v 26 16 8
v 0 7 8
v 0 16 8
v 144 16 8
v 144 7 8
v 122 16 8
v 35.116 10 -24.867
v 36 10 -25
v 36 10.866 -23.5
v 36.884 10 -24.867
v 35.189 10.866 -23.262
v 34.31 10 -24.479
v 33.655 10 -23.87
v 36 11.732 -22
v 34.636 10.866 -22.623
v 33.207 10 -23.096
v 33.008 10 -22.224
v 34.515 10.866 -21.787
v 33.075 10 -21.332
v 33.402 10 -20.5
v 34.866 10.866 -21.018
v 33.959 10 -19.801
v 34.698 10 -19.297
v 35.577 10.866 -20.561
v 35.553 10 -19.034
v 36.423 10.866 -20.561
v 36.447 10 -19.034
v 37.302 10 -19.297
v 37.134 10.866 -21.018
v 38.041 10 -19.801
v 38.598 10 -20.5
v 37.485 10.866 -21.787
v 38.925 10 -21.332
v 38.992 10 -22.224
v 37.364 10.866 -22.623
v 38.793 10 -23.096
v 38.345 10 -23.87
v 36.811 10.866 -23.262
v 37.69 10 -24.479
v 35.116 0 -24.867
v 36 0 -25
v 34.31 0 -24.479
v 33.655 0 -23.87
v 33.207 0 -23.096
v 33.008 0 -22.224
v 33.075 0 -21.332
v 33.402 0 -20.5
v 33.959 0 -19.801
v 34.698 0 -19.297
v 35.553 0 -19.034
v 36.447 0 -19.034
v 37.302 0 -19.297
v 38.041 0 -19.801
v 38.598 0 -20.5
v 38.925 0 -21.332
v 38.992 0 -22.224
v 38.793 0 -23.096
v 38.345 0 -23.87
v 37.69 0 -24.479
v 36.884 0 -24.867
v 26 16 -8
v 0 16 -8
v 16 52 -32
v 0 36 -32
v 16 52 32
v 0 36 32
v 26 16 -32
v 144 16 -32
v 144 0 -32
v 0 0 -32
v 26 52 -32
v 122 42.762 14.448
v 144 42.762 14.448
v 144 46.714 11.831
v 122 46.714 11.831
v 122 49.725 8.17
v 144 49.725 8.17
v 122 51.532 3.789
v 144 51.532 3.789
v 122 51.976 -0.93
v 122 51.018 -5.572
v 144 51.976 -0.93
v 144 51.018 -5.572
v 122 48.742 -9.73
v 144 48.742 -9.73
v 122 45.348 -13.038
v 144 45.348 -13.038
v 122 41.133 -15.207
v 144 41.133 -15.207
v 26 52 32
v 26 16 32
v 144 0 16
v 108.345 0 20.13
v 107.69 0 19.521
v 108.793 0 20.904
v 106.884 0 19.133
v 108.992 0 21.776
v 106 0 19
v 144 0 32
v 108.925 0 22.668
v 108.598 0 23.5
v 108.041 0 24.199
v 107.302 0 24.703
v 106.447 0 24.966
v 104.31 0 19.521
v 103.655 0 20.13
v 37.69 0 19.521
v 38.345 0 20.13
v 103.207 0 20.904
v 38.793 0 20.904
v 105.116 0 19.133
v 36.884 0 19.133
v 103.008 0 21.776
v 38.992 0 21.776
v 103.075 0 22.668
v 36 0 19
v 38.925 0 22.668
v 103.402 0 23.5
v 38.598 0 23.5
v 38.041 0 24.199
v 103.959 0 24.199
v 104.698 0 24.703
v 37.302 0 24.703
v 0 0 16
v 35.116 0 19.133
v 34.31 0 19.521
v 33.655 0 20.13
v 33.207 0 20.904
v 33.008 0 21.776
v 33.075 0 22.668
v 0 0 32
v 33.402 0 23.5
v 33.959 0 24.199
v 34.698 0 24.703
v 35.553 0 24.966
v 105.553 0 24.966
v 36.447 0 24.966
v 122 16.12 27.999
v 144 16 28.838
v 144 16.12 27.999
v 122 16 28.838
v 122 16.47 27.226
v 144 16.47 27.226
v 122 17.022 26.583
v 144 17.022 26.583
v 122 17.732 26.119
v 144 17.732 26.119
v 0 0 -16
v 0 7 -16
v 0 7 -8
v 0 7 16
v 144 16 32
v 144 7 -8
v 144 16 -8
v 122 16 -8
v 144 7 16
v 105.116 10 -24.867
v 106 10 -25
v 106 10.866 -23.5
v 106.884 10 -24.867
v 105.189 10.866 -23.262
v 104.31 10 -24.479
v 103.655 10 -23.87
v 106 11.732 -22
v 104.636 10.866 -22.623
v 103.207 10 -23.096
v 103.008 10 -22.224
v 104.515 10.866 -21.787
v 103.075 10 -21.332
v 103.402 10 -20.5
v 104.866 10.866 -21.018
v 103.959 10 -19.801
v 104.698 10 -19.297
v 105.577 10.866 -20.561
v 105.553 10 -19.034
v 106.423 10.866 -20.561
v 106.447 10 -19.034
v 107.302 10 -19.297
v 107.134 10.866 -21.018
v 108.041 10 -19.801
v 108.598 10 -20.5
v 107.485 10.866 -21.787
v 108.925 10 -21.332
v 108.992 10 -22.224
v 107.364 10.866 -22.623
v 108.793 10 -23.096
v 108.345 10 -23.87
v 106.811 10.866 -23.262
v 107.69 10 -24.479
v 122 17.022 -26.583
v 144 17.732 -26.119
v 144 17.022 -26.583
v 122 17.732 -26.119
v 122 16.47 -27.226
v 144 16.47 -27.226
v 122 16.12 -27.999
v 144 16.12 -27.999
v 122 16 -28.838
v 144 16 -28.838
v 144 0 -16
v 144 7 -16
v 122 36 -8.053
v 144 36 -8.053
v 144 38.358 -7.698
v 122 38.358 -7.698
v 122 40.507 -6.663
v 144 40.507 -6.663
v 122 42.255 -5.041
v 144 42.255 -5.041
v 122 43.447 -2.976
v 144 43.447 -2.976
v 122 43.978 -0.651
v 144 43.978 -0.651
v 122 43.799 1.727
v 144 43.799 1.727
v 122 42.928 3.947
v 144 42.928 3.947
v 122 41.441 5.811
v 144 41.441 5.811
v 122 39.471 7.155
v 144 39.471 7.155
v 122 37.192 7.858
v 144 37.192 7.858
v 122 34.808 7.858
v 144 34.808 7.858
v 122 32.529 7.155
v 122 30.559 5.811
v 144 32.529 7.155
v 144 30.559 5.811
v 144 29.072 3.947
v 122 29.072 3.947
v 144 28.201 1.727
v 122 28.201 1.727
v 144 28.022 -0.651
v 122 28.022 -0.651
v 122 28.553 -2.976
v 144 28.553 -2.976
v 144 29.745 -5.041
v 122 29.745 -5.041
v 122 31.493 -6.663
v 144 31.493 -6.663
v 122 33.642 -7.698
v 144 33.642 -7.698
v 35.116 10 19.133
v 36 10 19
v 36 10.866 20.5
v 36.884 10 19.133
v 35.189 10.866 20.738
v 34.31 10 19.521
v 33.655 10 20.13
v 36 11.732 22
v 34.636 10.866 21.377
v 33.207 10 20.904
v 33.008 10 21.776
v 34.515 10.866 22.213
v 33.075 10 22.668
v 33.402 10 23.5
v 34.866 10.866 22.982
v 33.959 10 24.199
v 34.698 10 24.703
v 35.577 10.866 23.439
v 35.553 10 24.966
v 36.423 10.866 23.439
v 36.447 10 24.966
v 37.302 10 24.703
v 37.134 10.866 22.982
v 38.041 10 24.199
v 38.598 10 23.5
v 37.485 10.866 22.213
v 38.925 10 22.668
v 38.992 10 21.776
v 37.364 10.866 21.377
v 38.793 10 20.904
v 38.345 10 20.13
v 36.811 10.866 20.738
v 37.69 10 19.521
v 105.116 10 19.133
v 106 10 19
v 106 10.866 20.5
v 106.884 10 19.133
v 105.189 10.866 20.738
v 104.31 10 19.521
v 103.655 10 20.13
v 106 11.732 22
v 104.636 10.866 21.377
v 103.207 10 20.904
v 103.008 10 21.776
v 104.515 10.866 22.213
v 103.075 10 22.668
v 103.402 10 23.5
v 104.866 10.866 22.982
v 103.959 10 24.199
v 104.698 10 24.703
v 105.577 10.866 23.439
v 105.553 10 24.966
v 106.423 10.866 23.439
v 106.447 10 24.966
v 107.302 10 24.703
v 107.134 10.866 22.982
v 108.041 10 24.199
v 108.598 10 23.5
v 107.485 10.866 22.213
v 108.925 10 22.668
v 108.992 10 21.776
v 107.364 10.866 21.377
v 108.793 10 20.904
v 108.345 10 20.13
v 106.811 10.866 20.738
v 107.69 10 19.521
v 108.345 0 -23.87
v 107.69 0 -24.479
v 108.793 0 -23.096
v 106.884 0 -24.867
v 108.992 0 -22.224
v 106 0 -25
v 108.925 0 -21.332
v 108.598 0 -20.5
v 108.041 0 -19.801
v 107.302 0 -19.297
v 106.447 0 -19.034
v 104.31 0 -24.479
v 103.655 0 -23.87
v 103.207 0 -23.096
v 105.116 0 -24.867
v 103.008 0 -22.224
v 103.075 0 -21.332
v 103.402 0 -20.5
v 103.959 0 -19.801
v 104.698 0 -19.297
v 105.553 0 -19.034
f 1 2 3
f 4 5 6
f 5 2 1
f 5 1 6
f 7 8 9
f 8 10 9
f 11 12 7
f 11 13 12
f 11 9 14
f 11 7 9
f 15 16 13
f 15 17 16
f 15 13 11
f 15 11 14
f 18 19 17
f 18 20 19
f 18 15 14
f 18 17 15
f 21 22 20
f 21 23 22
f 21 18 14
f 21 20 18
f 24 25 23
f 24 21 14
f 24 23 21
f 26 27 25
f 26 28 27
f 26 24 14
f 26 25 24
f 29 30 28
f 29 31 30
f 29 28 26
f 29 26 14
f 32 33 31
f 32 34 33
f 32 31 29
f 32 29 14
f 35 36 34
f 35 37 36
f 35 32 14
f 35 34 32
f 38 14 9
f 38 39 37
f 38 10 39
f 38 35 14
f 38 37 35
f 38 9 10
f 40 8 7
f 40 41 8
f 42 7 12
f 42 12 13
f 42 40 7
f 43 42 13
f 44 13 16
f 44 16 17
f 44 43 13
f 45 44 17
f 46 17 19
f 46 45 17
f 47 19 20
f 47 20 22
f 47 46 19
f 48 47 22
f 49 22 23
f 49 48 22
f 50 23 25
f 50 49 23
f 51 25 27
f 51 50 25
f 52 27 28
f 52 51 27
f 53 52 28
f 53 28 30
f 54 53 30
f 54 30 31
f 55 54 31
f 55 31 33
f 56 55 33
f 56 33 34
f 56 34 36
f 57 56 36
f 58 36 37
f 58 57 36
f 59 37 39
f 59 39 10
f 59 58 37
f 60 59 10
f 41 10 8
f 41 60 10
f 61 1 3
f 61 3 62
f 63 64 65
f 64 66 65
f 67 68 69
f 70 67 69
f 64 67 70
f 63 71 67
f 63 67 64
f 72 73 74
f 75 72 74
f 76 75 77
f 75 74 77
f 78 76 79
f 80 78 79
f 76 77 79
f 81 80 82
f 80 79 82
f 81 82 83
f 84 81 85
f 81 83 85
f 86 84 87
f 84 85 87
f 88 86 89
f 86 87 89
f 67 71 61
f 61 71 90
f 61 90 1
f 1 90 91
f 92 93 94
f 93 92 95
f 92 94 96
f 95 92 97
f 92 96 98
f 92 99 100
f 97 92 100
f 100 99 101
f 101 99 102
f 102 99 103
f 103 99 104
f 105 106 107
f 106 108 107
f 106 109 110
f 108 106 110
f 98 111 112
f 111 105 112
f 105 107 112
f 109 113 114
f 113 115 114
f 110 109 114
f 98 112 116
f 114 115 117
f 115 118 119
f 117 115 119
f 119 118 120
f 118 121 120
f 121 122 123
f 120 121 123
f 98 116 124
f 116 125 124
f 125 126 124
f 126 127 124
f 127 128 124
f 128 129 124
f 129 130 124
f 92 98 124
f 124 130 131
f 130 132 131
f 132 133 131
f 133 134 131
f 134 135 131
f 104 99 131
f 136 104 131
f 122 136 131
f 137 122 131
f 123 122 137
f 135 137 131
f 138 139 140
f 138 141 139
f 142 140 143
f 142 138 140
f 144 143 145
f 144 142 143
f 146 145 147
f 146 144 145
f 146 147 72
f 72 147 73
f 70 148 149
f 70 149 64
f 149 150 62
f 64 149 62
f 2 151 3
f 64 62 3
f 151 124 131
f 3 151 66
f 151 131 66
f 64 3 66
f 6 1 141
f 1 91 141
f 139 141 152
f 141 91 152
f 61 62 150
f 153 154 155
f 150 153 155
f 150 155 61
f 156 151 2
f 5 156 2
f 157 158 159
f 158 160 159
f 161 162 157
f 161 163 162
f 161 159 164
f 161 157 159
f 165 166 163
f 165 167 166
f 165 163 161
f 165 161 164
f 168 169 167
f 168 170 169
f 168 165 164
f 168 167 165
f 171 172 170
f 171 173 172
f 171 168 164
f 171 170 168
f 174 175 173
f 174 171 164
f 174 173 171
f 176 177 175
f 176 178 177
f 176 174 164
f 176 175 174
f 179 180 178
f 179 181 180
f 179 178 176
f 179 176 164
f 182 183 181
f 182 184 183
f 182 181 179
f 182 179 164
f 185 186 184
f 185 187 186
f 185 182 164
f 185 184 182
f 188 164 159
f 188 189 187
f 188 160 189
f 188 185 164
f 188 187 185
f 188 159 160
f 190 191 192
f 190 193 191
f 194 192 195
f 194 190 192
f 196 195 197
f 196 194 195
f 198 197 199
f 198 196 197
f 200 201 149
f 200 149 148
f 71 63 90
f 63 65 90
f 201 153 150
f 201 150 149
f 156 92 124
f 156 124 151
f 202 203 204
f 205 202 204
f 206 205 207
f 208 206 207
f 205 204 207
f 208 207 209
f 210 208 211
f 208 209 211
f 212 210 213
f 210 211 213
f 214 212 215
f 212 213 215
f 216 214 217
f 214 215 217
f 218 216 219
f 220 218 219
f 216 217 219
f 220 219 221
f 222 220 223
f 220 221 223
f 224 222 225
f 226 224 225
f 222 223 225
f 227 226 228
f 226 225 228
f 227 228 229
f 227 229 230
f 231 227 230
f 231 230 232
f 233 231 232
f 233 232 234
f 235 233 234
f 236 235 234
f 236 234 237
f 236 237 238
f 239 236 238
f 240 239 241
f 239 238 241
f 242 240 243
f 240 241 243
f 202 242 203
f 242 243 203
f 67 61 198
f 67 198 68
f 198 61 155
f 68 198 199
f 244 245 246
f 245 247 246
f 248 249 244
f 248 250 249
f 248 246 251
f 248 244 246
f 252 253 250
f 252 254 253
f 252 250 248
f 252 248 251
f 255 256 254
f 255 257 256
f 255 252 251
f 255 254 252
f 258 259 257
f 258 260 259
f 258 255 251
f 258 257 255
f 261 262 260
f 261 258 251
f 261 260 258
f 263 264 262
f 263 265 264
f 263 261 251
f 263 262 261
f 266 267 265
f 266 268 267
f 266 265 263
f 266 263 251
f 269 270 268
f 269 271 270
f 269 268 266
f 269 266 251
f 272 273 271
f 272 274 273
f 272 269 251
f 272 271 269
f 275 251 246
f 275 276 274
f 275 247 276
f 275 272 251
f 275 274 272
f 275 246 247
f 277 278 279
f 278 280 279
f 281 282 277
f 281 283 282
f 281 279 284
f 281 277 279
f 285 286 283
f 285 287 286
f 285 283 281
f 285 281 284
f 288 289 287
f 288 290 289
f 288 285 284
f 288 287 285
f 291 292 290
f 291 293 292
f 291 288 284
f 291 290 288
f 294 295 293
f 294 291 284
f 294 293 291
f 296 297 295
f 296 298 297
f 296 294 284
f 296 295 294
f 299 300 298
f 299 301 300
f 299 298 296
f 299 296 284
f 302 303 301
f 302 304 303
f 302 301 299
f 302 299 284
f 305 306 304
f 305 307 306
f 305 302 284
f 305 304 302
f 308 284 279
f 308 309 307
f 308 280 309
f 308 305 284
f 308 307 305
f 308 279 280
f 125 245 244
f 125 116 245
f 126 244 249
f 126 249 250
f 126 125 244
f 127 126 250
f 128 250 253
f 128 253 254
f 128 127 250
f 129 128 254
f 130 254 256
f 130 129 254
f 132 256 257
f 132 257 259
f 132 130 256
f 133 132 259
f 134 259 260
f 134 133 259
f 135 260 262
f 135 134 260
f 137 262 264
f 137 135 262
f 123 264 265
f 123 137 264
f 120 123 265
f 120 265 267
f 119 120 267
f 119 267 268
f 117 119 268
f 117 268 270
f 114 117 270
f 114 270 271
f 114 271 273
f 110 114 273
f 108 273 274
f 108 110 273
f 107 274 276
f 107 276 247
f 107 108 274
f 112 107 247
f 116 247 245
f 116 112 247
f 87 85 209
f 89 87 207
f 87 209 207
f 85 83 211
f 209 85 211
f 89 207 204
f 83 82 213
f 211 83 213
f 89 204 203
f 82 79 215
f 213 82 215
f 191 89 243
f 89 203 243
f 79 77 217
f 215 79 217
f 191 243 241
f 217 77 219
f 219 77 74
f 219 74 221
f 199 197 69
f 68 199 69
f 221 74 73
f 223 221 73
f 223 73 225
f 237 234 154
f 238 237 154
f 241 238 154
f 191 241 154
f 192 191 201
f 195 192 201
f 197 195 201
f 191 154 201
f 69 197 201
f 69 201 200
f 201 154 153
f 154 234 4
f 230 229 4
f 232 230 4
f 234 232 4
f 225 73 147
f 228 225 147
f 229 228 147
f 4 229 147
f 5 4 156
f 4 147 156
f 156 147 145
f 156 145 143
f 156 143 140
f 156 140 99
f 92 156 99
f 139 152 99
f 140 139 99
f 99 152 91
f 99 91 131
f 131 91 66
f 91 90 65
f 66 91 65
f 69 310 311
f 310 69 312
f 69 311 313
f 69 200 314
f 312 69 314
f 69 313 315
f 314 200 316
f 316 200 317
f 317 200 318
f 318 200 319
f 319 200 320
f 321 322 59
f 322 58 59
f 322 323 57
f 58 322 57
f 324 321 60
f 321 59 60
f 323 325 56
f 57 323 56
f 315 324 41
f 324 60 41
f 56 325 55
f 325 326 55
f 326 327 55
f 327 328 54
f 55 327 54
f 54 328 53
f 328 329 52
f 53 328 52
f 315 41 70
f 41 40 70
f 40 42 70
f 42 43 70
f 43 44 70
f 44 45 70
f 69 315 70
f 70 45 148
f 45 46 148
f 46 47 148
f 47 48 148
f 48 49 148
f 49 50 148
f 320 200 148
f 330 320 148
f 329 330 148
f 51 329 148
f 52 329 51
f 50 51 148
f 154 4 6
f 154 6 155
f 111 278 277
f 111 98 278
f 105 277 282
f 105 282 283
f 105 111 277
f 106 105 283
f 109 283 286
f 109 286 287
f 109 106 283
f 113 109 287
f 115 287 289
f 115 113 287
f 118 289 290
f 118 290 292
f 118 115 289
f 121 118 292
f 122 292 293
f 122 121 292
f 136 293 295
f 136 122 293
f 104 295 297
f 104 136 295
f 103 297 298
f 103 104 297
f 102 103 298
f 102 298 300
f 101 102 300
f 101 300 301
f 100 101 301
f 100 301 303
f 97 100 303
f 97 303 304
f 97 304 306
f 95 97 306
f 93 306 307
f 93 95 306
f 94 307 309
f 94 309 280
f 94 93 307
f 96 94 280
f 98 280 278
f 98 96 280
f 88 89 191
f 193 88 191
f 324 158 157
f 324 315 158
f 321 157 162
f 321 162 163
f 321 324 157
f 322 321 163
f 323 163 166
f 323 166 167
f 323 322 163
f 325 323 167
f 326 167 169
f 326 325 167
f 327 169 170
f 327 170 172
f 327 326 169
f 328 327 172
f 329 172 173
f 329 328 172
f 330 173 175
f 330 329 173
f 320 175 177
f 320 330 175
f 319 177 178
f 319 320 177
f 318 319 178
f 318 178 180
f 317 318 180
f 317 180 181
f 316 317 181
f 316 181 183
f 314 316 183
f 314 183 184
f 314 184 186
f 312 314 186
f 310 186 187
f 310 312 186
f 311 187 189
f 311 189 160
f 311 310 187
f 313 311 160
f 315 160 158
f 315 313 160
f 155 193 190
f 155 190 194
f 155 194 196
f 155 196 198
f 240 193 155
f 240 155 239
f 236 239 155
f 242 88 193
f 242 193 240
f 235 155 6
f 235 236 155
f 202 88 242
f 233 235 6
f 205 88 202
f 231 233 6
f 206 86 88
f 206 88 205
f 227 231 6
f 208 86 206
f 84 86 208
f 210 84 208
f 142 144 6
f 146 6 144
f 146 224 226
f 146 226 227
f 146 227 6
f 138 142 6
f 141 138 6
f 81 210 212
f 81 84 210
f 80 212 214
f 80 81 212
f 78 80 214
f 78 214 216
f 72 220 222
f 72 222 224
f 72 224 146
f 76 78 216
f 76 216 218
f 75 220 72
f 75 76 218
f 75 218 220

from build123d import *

# Parameters (mm, degrees)
BOSS_EXTRUDE1_DEPTH  = 32
BOSS_EXTRUDE7_DEPTH  = 22
SKETCH10_R           = 8
CUT_EXTRUDE1_DEPTH   = 22
FILLET1_R            = 3
FILLET2_R            = 3
CUT_EXTRUDE2_DEPTH   = 157.409718368
LPATTERN1_COUNT      = 2
LPATTERN1_PITCH      = 70
LPATTERN1_COUNT_DIR2 = 2
LPATTERN1_PITCH_DIR2 = 44


with BuildPart() as part:
    # Sketch3 → Boss-Extrude1 (new, symmetric)
    with BuildSketch(Plane.XY):
        Polygon((0, 0), (0, 36), (16, 52), (26, 52), (26, 16), (144, 16), (144, 0), align=None)
    extrude(amount=BOSS_EXTRUDE1_DEPTH, both=True)

    # Sketch4 → Boss-Extrude7 (add)
    with BuildSketch(Plane(origin=(144, 0, 0), x_dir=(0, 0, -1), z_dir=(1, 0, 0))):
        with BuildLine():
            Line((-26.927127132, 16), (-14.447851858, 42.761892188))
            ThreePointArc((-14.447851858, 42.761892188), (0.930343347, 51.975931781), (15.207195845, 41.133473752))
            Line((15.207195845, 41.133473752), (26.927127132, 16))
            Line((26.927127132, 16), (-26.927127132, 16))
        make_face()
    extrude(amount=-BOSS_EXTRUDE7_DEPTH)

    # Sketch10 → Cut-Extrude1 (cut)
    with BuildSketch(Plane(origin=(144, 0, 0), x_dir=(0, 0, -1), z_dir=(1, 0, 0))):
        with Locations((0.053072735, 36)):
            Circle(SKETCH10_R)
    extrude(amount=-CUT_EXTRUDE1_DEPTH, mode=Mode.SUBTRACT)

    # Fillet1
    fillet1_edges = [part.edges().sort_by_distance(p)[0] for p in [
        (133, 16, 26.927127132),
    ]]
    fillet(fillet1_edges, radius=FILLET1_R)

    # Fillet2
    fillet2_edges = [part.edges().sort_by_distance(p)[0] for p in [
        (133, 16, -26.927127132),
    ]]
    fillet(fillet2_edges, radius=FILLET2_R)

    # Sketch11 → Cut-Extrude2 (cut, through all)
    with BuildSketch(Plane(origin=(144, 0, 0), x_dir=(0, 0, -1), z_dir=(1, 0, 0))):
        Polygon((-16, -7.593125262), (-16, 7), (-8, 7), (-8, 16), (8, 16), (8, 7), (16, 7), (16, -7.593125262), align=None)
    extrude(amount=-CUT_EXTRUDE2_DEPTH, mode=Mode.SUBTRACT)

    # Sketch13 → Ø1.0mm Dowel Hole1 (revolve, cut)
    with BuildSketch(Plane(origin=(106, 0, 22), x_dir=(0, 0, -1), z_dir=(1, 0, 0))):
        Polygon((0, 0), (0, 11.732050808), (3, 10), (3, 0), align=None)
    f_1_0mm_dowel_hole1 = revolve(axis=Axis((106, -6.35, 22), (0, 1, 0)), mode=Mode.SUBTRACT)

    # LPattern1: 1.0mm Dowel Hole1 2 × 2
    with Locations(*[(-i * LPATTERN1_PITCH, 0, -j * LPATTERN1_PITCH_DIR2) for i in range(LPATTERN1_COUNT) for j in range(LPATTERN1_COUNT_DIR2) if (i, j) != (0, 0)]):
        add(f_1_0mm_dowel_hole1, mode=Mode.SUBTRACT)


solid = part.part
